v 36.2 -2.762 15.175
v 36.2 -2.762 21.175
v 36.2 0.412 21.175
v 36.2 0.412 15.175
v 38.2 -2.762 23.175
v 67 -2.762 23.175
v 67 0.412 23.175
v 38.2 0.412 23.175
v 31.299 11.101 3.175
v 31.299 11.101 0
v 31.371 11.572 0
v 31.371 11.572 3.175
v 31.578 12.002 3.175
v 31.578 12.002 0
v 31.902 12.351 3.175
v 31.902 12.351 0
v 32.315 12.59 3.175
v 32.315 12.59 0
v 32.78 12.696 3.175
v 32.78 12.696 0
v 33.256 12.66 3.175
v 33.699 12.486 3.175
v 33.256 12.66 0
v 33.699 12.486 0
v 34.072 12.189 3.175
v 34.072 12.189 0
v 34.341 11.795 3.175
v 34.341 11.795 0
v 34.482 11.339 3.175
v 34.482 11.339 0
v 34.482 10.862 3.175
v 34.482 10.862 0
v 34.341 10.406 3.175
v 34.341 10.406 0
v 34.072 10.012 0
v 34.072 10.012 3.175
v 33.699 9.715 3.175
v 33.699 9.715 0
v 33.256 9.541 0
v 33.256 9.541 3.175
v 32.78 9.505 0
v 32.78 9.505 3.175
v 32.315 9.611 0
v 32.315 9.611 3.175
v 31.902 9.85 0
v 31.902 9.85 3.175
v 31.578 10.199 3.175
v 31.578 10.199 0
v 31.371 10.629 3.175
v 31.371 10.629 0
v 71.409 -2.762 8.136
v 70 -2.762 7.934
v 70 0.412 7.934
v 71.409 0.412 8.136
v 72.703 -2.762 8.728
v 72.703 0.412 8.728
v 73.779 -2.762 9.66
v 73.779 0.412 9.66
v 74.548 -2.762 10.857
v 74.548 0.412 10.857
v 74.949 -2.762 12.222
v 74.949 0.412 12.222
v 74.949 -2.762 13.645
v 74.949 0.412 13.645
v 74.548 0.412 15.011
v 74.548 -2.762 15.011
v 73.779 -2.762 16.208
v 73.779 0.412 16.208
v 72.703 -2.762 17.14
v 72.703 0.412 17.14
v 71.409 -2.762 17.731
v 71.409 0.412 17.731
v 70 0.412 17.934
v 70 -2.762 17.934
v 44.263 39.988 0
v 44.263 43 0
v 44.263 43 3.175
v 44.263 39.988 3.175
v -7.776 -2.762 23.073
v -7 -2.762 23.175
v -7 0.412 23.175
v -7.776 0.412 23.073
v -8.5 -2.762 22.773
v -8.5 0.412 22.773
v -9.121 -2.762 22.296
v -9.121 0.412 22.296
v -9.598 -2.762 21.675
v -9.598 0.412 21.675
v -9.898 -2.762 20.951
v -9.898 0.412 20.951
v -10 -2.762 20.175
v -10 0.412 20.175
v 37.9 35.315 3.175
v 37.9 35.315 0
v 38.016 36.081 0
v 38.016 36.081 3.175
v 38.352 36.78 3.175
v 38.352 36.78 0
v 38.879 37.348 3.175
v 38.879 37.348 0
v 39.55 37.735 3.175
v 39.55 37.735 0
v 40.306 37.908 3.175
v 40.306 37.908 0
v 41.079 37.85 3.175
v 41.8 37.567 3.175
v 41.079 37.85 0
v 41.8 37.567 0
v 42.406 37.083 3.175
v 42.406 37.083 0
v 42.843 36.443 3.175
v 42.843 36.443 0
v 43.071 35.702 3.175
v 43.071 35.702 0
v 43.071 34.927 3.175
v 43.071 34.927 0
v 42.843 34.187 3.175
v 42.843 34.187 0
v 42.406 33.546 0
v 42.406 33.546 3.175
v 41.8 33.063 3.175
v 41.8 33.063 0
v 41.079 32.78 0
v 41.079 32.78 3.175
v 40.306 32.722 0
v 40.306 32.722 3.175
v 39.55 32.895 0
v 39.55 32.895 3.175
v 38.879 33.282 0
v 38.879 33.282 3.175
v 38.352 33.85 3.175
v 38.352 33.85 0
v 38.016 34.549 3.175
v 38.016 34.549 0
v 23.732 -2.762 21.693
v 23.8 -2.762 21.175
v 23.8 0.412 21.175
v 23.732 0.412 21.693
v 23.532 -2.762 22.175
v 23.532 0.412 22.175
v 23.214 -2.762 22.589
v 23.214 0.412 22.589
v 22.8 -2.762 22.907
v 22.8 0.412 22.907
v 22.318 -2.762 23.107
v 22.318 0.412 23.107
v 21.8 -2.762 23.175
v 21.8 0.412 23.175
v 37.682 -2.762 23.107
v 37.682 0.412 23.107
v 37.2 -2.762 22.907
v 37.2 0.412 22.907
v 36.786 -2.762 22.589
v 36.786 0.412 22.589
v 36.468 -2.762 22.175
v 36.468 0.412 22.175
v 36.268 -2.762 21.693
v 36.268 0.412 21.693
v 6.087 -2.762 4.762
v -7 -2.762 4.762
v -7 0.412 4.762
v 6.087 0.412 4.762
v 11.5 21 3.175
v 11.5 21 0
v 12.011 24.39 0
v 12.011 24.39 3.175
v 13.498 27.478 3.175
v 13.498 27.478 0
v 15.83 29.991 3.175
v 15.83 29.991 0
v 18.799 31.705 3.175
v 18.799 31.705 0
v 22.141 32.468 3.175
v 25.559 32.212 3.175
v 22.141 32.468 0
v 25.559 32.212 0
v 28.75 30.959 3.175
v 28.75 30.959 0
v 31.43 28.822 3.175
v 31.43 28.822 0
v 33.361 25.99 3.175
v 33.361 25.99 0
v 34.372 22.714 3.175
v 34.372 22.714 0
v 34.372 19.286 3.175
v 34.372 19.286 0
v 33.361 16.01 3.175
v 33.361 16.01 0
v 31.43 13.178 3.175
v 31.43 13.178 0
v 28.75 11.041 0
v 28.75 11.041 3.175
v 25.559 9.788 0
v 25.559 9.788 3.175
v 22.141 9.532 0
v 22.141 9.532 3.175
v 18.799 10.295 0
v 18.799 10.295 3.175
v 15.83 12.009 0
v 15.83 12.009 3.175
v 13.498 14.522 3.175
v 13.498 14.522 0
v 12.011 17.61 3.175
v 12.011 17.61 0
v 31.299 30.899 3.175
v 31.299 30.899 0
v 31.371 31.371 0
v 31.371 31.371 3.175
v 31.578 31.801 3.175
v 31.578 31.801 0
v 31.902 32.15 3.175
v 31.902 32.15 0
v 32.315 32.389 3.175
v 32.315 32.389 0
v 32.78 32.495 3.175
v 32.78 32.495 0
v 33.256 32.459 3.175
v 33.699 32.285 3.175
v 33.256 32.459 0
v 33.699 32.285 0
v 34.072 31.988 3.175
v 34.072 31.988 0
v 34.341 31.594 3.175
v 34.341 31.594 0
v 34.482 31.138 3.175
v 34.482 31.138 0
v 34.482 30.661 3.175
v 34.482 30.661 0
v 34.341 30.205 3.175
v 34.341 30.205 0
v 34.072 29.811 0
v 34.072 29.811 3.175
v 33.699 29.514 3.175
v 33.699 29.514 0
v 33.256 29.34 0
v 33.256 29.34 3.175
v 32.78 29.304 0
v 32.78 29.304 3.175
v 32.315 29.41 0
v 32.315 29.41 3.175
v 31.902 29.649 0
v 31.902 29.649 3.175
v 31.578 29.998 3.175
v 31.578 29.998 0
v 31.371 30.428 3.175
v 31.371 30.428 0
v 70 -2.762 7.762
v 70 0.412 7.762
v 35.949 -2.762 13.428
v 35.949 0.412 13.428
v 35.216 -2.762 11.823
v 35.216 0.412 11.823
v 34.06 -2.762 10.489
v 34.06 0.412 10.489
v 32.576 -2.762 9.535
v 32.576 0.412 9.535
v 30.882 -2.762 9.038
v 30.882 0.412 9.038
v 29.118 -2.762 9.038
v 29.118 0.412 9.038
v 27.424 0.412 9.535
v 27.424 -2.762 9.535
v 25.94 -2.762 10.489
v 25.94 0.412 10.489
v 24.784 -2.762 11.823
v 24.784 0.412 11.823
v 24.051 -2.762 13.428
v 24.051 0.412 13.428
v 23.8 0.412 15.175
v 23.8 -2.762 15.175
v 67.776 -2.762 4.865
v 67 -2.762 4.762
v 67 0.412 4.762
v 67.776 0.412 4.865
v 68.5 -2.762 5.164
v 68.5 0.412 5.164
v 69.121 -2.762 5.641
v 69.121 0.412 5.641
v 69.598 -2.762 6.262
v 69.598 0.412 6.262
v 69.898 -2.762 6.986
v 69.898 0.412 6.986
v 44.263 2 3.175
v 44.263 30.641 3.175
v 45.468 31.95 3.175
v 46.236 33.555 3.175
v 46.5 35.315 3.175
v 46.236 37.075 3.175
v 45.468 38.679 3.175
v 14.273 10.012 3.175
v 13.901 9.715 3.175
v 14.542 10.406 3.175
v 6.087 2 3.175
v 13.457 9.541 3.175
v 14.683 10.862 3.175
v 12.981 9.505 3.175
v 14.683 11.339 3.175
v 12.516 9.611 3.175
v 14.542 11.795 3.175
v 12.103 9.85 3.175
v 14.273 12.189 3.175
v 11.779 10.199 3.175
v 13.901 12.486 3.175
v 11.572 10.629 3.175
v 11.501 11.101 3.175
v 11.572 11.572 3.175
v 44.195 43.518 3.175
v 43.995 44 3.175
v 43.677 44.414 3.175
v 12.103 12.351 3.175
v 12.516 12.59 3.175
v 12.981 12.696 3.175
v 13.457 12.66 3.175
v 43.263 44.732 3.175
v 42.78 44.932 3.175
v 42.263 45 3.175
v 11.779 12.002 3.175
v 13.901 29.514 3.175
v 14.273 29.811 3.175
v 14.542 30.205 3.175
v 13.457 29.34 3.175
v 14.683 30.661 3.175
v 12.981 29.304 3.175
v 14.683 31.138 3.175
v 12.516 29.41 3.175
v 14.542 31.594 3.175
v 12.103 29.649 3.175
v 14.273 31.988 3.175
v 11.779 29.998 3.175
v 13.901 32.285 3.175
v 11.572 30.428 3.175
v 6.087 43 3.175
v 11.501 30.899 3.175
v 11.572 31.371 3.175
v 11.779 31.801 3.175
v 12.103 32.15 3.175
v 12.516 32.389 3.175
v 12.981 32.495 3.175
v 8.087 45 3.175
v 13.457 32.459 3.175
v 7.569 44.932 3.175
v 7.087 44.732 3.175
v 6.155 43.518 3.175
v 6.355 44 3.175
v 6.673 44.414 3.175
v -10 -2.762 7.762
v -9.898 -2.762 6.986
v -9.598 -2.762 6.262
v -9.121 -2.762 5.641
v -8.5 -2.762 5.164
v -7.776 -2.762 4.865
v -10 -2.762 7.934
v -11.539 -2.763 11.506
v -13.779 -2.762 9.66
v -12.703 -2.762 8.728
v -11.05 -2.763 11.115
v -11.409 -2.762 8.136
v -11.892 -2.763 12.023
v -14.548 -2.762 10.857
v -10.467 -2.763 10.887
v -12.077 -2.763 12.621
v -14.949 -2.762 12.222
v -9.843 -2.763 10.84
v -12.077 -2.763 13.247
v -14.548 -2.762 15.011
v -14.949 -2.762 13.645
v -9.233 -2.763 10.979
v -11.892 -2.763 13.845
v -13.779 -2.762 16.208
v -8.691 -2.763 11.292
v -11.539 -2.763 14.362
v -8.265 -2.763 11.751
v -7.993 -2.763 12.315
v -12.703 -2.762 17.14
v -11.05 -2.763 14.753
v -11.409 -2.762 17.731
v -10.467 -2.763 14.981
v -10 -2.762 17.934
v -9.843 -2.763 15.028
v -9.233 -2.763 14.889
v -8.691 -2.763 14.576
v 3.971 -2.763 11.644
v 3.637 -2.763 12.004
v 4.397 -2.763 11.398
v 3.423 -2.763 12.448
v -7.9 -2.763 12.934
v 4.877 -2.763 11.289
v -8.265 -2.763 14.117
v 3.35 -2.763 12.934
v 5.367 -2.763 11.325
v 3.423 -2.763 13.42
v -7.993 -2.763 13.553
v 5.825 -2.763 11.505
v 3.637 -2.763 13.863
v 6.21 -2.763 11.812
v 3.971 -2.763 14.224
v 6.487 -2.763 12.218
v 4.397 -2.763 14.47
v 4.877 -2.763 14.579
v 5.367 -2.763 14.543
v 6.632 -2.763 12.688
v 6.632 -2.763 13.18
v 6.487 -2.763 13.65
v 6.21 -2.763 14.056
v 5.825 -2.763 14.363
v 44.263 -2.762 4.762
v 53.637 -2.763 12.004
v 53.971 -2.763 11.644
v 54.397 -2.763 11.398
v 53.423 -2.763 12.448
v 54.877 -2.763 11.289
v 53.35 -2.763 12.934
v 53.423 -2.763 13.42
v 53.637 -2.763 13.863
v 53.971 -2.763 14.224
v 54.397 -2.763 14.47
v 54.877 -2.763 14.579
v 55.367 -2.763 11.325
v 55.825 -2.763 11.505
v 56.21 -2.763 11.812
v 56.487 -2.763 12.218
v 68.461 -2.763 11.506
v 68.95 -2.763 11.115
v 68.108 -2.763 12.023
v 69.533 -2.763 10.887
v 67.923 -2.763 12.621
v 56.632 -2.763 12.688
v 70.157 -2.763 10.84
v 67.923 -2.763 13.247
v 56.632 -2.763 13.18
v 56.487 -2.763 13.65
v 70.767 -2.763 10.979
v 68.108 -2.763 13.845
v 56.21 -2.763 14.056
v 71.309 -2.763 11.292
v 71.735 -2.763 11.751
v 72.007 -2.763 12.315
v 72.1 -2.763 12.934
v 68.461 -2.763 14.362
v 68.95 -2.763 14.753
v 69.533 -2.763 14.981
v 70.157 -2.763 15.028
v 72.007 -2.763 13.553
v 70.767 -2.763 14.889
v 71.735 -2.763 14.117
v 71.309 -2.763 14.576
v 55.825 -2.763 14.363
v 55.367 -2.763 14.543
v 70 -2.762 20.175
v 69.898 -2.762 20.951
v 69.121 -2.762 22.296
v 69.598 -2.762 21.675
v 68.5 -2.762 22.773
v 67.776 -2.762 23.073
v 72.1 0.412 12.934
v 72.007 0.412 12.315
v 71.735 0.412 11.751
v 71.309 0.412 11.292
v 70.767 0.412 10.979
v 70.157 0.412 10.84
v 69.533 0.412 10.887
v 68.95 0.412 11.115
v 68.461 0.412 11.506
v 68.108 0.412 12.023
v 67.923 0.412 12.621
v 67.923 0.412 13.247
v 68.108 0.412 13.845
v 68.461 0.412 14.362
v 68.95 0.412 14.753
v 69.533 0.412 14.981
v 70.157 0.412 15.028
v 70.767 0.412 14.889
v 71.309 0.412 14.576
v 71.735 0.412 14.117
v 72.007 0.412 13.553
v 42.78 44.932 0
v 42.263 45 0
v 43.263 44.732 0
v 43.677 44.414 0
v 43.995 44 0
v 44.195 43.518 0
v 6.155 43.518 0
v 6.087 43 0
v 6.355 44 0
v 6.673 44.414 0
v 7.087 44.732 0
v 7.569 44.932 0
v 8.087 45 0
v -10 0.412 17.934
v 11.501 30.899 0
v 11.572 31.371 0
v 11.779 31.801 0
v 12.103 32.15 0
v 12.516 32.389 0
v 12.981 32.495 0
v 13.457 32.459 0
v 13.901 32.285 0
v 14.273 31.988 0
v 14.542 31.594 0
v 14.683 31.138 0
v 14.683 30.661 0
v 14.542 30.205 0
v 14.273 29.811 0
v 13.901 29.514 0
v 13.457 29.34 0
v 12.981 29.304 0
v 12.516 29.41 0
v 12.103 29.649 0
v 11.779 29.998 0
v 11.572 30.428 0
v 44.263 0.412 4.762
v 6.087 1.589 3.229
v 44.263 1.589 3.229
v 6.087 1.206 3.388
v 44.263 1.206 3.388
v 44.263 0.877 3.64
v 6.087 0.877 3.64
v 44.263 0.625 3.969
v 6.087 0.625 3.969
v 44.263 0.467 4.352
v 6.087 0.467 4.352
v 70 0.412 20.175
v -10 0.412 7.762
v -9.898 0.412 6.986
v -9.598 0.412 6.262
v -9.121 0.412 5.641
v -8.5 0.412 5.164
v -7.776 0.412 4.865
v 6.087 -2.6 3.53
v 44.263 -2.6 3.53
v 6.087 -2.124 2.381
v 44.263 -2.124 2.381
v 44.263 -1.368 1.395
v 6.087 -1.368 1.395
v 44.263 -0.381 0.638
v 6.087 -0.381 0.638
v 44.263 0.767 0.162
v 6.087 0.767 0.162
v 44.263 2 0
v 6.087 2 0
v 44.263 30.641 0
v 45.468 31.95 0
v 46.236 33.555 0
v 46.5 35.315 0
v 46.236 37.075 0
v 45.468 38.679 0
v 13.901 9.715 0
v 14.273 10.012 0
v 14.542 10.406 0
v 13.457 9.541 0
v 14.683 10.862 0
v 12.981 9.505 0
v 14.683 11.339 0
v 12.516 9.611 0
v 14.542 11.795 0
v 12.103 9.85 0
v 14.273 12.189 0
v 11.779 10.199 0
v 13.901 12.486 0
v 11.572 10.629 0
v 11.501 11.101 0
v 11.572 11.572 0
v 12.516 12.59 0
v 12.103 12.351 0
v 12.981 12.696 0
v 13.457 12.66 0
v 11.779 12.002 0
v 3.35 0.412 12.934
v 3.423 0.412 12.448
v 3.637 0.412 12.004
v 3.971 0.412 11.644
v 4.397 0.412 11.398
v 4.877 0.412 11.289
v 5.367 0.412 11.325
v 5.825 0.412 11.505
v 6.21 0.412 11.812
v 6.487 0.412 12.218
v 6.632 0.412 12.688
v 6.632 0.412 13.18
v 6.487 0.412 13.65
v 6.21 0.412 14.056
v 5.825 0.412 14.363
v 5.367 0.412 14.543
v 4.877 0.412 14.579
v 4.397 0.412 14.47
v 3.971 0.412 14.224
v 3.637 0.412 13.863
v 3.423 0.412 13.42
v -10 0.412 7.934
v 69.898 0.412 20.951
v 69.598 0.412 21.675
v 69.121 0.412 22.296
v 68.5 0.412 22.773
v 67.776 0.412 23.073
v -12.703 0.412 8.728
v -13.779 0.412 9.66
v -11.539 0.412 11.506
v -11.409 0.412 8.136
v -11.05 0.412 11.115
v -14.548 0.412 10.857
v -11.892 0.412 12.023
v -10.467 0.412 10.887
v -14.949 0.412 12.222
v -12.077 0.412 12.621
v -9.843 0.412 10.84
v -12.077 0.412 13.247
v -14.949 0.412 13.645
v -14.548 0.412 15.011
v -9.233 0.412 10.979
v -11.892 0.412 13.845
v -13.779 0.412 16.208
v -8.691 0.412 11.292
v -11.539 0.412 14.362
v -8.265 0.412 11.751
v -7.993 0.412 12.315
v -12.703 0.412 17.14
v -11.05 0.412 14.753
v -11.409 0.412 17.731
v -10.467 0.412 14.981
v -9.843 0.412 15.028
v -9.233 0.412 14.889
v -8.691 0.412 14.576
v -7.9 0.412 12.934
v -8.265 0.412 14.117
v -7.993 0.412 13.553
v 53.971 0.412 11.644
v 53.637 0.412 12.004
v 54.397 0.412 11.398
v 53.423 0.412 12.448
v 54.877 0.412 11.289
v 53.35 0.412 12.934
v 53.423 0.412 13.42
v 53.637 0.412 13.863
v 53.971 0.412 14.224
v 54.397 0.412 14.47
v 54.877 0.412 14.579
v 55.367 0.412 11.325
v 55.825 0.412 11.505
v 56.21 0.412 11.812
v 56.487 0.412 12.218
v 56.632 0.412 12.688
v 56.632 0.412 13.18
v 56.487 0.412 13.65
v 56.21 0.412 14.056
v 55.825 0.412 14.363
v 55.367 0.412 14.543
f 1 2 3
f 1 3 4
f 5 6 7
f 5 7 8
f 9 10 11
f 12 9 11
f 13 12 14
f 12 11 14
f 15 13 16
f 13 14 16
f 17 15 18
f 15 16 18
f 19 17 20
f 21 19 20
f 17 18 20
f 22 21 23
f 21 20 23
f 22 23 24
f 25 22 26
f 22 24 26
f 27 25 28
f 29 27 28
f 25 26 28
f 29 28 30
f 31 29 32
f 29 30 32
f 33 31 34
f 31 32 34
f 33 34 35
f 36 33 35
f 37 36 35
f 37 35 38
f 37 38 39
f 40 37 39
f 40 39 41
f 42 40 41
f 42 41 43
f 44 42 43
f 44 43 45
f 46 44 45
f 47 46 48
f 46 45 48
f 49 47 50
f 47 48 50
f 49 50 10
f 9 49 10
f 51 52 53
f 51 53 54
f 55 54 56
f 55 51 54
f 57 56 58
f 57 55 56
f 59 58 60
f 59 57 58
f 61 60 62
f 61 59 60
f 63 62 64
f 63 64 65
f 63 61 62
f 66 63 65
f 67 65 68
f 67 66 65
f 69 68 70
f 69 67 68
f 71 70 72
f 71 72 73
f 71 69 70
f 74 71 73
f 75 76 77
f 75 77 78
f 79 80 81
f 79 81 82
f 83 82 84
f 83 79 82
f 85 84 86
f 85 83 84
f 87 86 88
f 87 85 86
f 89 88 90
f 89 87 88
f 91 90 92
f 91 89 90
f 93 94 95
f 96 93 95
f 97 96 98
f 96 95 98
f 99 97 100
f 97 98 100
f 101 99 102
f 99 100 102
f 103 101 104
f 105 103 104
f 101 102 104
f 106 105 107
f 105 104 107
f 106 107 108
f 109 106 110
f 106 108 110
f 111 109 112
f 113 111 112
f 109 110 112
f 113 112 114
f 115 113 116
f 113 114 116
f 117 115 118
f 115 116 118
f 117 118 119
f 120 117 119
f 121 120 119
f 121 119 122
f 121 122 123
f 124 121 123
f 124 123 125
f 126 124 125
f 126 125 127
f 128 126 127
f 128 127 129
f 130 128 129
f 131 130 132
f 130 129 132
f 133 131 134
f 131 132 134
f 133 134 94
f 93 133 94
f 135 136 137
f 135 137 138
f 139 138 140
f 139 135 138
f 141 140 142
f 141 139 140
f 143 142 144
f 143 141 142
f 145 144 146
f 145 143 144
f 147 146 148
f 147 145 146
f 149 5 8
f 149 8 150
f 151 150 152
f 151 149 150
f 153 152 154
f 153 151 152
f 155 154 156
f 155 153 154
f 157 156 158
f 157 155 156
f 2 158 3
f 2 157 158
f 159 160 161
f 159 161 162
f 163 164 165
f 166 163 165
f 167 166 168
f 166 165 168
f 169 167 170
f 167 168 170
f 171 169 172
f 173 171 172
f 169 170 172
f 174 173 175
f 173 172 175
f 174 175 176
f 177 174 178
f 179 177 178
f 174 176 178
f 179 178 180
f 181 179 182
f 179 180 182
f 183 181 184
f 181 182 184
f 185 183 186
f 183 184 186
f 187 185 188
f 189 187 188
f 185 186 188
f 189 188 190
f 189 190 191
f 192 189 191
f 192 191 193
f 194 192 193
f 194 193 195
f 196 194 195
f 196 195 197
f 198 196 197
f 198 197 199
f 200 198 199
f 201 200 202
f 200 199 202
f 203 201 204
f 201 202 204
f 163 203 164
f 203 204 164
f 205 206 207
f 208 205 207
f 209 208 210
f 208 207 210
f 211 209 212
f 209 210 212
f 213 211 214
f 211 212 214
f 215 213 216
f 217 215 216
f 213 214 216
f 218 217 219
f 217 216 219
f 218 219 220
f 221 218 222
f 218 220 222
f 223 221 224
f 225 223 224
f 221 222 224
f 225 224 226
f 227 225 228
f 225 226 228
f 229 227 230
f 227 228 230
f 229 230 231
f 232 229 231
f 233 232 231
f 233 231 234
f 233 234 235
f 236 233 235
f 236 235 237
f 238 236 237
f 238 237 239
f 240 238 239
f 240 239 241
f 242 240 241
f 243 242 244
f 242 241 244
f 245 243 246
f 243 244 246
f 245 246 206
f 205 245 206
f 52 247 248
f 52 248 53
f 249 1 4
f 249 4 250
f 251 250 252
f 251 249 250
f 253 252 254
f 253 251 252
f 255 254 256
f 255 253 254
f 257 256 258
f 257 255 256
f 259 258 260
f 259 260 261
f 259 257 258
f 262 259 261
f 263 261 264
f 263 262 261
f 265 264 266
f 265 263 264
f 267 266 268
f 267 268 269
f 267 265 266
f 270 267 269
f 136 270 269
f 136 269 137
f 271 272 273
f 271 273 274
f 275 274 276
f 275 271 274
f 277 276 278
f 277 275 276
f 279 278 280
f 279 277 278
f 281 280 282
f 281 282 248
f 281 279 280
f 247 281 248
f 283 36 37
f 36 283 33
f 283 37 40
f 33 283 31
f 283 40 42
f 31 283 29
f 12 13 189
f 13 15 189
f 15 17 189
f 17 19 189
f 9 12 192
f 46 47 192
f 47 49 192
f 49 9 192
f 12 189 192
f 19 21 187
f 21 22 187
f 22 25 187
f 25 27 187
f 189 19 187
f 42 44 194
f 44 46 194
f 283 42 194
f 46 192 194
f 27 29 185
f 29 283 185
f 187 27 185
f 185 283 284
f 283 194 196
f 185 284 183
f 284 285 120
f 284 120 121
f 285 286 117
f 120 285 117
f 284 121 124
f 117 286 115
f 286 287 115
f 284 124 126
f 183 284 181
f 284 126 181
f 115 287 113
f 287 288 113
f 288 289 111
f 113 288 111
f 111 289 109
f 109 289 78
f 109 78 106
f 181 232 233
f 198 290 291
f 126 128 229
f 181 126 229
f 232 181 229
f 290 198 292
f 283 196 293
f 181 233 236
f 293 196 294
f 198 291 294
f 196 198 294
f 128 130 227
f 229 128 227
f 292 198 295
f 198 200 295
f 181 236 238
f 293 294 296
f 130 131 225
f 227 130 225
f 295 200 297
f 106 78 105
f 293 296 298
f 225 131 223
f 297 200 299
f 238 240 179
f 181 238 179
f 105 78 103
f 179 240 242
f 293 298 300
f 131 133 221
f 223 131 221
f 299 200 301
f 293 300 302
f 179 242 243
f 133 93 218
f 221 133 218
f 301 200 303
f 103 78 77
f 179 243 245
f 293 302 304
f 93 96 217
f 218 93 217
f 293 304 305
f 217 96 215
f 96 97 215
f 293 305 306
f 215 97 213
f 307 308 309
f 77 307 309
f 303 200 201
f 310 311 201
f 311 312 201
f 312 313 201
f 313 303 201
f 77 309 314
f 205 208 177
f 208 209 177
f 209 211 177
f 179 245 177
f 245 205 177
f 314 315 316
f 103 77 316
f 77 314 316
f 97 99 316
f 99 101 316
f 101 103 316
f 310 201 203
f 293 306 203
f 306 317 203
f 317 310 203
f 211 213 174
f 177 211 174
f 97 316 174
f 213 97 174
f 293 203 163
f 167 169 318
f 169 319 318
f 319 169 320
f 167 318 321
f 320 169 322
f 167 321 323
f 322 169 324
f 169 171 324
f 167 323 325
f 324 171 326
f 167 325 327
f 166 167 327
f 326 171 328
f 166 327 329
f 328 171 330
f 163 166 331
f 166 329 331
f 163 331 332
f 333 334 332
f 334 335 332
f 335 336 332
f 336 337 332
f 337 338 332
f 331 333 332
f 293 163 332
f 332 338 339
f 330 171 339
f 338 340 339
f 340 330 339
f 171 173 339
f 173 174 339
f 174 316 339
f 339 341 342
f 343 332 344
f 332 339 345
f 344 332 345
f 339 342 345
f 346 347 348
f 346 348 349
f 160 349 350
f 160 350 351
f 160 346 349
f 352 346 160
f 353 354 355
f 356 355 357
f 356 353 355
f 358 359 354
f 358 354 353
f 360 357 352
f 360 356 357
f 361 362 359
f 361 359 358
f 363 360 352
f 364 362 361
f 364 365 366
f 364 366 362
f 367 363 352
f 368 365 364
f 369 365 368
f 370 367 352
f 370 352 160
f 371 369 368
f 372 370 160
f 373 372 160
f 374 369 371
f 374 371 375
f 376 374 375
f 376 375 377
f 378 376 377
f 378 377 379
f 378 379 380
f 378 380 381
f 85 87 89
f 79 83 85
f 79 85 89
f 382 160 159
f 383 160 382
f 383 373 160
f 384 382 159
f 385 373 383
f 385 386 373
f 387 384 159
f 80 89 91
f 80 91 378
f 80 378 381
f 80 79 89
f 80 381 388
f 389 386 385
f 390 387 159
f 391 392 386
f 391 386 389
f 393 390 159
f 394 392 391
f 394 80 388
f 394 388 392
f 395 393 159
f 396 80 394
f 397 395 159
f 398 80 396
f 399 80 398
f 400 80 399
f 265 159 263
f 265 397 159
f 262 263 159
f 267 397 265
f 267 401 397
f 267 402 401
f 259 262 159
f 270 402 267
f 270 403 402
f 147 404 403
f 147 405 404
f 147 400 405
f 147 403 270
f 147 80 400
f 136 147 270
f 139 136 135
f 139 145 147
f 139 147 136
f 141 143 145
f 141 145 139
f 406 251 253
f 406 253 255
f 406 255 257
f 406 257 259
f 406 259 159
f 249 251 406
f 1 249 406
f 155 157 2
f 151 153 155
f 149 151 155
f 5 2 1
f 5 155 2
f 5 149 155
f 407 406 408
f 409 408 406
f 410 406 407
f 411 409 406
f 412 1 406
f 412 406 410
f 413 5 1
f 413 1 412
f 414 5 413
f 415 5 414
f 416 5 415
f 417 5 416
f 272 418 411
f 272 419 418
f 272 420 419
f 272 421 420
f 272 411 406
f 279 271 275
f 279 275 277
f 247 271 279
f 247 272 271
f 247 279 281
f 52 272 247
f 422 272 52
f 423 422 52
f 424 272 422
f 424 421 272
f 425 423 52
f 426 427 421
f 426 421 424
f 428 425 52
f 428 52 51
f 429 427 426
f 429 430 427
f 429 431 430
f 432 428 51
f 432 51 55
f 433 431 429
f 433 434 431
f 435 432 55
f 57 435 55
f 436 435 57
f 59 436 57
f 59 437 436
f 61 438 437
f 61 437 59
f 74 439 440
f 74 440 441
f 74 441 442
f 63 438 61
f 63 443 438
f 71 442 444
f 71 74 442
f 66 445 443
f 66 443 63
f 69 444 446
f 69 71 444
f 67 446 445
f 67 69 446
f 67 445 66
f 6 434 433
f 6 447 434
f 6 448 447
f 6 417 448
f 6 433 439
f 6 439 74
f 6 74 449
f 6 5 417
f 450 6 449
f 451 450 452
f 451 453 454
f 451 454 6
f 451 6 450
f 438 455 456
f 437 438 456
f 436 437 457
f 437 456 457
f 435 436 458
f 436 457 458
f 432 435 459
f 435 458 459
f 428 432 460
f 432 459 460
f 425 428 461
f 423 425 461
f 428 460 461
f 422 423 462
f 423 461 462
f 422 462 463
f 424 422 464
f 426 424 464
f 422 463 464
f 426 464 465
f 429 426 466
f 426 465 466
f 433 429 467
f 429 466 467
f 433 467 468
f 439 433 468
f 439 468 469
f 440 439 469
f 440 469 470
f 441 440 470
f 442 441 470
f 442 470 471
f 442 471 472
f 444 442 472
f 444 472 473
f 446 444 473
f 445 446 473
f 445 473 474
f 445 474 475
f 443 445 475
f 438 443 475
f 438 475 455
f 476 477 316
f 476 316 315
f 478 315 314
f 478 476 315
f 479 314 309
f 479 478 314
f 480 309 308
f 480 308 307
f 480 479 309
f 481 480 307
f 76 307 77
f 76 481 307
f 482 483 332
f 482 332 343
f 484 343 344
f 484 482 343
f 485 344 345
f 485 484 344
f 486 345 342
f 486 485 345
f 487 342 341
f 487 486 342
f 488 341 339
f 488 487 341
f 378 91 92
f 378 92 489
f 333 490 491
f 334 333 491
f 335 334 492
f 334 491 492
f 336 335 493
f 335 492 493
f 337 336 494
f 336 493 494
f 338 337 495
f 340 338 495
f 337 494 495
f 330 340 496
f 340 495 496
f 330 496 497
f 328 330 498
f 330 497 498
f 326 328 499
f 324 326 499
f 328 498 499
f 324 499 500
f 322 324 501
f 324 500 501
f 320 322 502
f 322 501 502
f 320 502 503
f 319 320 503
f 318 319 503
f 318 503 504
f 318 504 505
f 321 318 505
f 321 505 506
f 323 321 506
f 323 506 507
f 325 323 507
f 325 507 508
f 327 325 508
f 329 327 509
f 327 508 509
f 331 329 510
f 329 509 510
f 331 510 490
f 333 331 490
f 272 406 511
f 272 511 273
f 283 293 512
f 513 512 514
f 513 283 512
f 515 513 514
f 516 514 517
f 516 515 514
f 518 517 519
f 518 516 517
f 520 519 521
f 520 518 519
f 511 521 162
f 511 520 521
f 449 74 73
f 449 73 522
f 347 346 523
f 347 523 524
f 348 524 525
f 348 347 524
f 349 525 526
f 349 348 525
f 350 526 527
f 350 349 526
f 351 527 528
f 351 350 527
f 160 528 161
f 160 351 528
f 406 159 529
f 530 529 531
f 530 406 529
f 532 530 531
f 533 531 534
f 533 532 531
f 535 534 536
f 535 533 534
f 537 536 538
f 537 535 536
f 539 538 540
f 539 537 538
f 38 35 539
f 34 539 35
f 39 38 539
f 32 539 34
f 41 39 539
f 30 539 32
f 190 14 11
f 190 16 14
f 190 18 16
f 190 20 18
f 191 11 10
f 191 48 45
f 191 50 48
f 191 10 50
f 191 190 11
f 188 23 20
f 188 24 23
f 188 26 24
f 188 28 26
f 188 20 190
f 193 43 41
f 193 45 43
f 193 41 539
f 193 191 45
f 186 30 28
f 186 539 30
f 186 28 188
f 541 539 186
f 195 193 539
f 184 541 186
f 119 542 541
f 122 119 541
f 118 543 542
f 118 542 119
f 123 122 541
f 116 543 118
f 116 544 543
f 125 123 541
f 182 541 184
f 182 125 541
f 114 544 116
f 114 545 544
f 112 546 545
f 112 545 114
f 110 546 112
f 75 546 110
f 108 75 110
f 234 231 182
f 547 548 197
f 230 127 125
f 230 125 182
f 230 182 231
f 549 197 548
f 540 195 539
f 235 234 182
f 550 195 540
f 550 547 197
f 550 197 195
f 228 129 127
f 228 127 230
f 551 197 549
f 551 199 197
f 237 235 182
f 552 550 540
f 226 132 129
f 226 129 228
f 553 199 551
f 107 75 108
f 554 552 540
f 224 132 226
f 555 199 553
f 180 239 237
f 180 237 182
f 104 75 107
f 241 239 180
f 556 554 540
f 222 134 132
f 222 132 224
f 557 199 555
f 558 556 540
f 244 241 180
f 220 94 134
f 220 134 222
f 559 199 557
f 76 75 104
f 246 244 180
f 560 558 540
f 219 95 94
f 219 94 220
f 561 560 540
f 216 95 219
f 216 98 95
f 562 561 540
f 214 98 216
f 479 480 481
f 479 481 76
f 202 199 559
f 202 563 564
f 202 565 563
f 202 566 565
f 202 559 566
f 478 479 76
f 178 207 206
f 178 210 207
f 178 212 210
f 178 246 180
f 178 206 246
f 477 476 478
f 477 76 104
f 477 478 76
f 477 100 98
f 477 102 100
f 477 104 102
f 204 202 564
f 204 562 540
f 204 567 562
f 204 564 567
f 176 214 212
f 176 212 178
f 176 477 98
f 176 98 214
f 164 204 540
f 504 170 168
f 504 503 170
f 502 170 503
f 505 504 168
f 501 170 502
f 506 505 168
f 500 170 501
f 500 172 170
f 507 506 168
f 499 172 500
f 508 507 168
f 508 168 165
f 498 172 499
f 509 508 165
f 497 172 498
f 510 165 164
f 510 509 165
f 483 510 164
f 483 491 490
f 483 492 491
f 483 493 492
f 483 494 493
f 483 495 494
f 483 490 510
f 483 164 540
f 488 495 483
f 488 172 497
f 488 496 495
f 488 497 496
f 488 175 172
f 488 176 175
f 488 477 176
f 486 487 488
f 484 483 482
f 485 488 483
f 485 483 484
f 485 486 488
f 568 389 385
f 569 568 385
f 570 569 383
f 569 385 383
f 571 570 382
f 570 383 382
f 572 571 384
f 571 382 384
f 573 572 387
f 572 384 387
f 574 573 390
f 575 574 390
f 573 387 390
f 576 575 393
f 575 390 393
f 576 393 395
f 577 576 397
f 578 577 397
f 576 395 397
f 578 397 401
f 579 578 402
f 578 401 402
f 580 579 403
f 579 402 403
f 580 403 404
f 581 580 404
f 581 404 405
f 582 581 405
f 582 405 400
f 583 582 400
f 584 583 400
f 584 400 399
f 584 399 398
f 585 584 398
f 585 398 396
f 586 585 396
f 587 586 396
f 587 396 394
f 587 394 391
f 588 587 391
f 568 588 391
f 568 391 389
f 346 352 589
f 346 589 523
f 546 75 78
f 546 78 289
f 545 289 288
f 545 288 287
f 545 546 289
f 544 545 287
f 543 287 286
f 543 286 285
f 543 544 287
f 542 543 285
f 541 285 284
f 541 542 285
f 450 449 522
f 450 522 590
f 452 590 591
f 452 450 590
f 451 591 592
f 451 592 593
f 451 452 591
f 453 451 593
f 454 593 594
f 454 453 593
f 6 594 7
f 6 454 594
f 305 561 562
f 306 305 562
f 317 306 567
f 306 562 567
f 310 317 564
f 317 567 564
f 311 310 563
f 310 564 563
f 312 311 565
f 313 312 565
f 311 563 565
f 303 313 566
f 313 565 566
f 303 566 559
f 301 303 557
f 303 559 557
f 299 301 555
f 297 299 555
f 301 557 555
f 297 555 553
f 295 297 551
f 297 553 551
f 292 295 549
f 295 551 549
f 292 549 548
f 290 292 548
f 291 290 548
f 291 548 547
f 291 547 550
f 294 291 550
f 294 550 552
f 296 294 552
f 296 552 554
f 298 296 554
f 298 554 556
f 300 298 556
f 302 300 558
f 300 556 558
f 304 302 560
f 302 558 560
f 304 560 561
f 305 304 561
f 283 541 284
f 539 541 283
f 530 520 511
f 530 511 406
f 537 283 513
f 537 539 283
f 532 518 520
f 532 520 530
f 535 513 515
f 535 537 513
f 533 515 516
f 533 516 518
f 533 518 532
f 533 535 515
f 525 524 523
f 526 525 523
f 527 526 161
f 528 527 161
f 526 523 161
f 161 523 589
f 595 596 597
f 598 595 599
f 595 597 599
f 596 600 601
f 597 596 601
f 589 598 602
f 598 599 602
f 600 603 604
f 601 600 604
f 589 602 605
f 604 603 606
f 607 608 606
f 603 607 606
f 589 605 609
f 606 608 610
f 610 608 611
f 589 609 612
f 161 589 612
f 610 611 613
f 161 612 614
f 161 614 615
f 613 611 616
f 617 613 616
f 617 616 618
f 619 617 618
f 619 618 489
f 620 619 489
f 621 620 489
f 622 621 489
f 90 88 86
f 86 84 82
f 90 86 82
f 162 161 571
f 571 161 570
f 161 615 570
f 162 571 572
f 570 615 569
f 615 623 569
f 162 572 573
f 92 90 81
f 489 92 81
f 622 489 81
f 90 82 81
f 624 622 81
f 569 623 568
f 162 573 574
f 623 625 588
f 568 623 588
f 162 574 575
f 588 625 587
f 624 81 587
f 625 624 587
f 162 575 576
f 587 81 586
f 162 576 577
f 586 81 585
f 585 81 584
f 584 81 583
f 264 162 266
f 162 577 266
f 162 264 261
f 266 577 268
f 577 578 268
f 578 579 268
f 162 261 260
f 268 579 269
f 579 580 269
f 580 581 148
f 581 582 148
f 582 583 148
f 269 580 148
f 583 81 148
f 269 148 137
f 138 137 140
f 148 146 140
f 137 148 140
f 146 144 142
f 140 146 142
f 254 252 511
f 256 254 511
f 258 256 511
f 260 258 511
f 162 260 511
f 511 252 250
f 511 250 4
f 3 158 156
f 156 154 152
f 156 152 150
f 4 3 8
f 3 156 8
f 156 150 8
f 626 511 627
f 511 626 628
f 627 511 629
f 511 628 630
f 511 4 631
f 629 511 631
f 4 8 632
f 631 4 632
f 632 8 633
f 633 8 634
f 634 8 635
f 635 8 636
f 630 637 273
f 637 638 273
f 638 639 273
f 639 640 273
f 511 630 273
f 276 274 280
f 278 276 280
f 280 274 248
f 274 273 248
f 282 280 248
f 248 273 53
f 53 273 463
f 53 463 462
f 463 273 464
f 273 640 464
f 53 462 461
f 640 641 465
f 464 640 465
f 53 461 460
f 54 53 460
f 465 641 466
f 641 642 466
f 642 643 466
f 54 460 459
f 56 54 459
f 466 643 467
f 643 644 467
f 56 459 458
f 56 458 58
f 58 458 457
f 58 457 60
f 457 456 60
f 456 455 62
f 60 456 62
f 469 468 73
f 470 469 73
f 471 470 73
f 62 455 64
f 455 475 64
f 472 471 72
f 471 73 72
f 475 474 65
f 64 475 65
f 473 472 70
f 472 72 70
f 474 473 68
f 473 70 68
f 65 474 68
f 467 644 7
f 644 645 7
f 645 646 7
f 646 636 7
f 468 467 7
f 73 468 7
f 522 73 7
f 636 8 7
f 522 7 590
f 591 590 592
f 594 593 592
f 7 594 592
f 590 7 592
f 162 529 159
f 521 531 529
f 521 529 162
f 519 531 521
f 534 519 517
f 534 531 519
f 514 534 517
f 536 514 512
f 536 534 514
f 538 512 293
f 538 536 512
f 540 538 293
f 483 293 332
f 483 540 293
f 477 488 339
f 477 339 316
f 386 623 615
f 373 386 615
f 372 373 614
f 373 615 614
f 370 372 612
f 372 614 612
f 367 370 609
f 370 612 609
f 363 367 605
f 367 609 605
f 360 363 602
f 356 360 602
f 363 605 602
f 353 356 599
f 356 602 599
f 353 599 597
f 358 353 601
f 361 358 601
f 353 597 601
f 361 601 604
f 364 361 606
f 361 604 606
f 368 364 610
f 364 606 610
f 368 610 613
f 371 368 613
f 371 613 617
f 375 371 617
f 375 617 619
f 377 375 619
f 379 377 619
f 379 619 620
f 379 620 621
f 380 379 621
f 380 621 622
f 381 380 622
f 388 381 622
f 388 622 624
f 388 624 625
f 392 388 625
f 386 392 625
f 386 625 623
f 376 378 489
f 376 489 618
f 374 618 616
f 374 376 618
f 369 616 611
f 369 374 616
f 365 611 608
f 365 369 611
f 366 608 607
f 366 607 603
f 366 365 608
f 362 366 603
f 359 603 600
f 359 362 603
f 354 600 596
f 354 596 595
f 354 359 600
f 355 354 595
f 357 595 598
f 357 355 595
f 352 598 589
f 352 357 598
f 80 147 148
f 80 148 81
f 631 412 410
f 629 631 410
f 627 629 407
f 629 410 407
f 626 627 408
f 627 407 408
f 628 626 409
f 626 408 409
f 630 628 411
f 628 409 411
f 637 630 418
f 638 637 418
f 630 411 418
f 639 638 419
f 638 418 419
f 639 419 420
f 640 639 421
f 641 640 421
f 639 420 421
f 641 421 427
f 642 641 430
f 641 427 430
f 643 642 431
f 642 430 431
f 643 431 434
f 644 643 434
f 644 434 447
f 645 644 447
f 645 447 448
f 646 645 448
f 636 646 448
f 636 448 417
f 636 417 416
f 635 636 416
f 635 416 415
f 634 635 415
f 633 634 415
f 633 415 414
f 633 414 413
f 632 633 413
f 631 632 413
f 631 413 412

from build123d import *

# Parameters (mm, degrees)
BASE_FLANGE1_DEPTH         = 3.175
F_4_2_4_2_DIAMETER_HOLE1_D = 4.2
F_3_3_3_3_DIAMETER_HOLE1_D = 3.3
EDGE_FLANGE1_DEPTH         = 38.176085753
EDGE_FLANGE1_START         = 3.175
EDGE_FLANGE1_PROFILE_R     = 1.6
EDGE_FLANGE1_PROFILE_R_2   = 11.5
EDGE_FLANGE1_PROFILE_R_3   = 2.6
EDGE_FLANGE1_FLAT_DEPTH    = 3.175


# Sheet-metal steps are written as plain solids
with BuildPart() as part:
    # Sketch11 → Base-Flange1 (new body)
    with BuildSketch(Plane.XZ.offset(2.7625)):
        with BuildLine():
            Line((36.2, 21.175), (36.2, 15.175))
            ThreePointArc((36.2, 15.175), (30, 8.975), (23.8, 15.175))
            Line((23.8, 15.175), (23.8, 21.175))
            ThreePointArc((23.8, 21.175), (23.214213562, 22.589213562), (21.8, 23.175))
            Line((21.8, 23.175), (-7, 23.175))
            ThreePointArc((-7, 23.175), (-9.121320344, 22.296320344), (-10, 20.175))
            Line((-10, 20.175), (-10, 17.93389))
            ThreePointArc((-10, 17.93389), (-15, 12.93389), (-10, 7.93389))
            Line((-10, 7.93389), (-10, 7.7625))
            ThreePointArc((-10, 7.7625), (-9.121320344, 5.641179656), (-7, 4.7625))
            Line((-7, 4.7625), (67, 4.7625))
            ThreePointArc((67, 4.7625), (69.121320344, 5.641179656), (70, 7.7625))
            Line((70, 7.7625), (70, 7.93389))
            ThreePointArc((70, 7.93389), (75, 12.93389), (70, 17.93389))
            Line((70, 17.93389), (70, 20.175))
            ThreePointArc((70, 20.175), (69.121320344, 22.296320344), (67, 23.175))
            Line((67, 23.175), (38.2, 23.175))
            ThreePointArc((38.2, 23.175), (36.785786438, 22.589213562), (36.2, 21.175))
        make_face()
    extrude(amount=-BASE_FLANGE1_DEPTH)

    # Ø4.2 (4.2) Diameter Hole1 (through all)
    with Locations(Plane(origin=(0, -2.7625, 0), x_dir=(-1, 0, 0), z_dir=(0, -1, 0))):
        with Locations((-70, -12.93389), (10, -12.93389)):
            Hole(F_4_2_4_2_DIAMETER_HOLE1_D / 2)

    # Ø3.3 (3.3) Diameter Hole1 (through all)
    with Locations(Plane(origin=(0, 0.4125, 0), x_dir=(1, 0, 0), z_dir=(0, 1, 0))):
        with Locations((5, -12.93389), (55, -12.93389)):
            Hole(F_3_3_3_3_DIAMETER_HOLE1_D / 2)

    # Edge-Flange1 bend section (across the edge) → Edge-Flange1 (add)
    with BuildSketch(Plane(origin=(44.262809753, 0.4125, 3.175), x_dir=(0, 0, 1), z_dir=(-1, 0, 0))):
        with BuildLine():
            Line((-3.175, 1.5875), (0, 1.5875))
            ThreePointArc((0, 1.5875), (0.464967985, 0.464967985), (1.5875, 0))
            Line((1.5875, 0), (1.5875, -3.175))
            ThreePointArc((1.5875, -3.175), (-1.780096045, -1.780096045), (-3.175, 1.5875))
        make_face()
    extrude(amount=EDGE_FLANGE1_DEPTH)

    # Edge-Flange1 profile (on flange) → Edge-Flange1 flat (add)
    with BuildSketch(Plane(origin=(0, 0.4125, 3.175), x_dir=(-1, 0, 0), z_dir=(0, 0, -1)).offset(EDGE_FLANGE1_START)):
        with BuildLine():
            ThreePointArc((-6.086724, 42.5875), (-6.672510438, 44.001713562), (-8.086724, 44.5875))
            Line((-8.086724, 44.5875), (-42.262809753, 44.5875))
            ThreePointArc((-42.262809753, 44.5875), (-43.677023316, 44.001713562), (-44.262809753, 42.5875))
            Line((-44.262809753, 42.5875), (-44.262809753, 39.575887728))
            ThreePointArc((-44.262809753, 39.575887728), (-46.5, 34.902424049), (-44.262809753, 30.22896037))
            Line((-44.262809753, 30.22896037), (-44.262809753, 1.5875))
            Line((-44.262809753, 1.5875), (-6.086724, 1.5875))
            Line((-6.086724, 1.5875), (-6.086724, 42.5875))
        make_face()
        with Locations((-13.100505063, 10.688005063)):
            Circle(EDGE_FLANGE1_PROFILE_R, mode=Mode.SUBTRACT)
        with Locations((-23, 20.5875)):
            Circle(EDGE_FLANGE1_PROFILE_R_2, mode=Mode.SUBTRACT)
        with Locations((-32.899494937, 10.688005063)):
            Circle(EDGE_FLANGE1_PROFILE_R, mode=Mode.SUBTRACT)
        with Locations((-13.100505063, 30.486994937)):
            Circle(EDGE_FLANGE1_PROFILE_R, mode=Mode.SUBTRACT)
        with Locations((-32.899494937, 30.486994937)):
            Circle(EDGE_FLANGE1_PROFILE_R, mode=Mode.SUBTRACT)
        with Locations((-40.5, 34.902424049)):
            Circle(EDGE_FLANGE1_PROFILE_R_3, mode=Mode.SUBTRACT)
    extrude(amount=-EDGE_FLANGE1_FLAT_DEPTH)


solid = part.part
